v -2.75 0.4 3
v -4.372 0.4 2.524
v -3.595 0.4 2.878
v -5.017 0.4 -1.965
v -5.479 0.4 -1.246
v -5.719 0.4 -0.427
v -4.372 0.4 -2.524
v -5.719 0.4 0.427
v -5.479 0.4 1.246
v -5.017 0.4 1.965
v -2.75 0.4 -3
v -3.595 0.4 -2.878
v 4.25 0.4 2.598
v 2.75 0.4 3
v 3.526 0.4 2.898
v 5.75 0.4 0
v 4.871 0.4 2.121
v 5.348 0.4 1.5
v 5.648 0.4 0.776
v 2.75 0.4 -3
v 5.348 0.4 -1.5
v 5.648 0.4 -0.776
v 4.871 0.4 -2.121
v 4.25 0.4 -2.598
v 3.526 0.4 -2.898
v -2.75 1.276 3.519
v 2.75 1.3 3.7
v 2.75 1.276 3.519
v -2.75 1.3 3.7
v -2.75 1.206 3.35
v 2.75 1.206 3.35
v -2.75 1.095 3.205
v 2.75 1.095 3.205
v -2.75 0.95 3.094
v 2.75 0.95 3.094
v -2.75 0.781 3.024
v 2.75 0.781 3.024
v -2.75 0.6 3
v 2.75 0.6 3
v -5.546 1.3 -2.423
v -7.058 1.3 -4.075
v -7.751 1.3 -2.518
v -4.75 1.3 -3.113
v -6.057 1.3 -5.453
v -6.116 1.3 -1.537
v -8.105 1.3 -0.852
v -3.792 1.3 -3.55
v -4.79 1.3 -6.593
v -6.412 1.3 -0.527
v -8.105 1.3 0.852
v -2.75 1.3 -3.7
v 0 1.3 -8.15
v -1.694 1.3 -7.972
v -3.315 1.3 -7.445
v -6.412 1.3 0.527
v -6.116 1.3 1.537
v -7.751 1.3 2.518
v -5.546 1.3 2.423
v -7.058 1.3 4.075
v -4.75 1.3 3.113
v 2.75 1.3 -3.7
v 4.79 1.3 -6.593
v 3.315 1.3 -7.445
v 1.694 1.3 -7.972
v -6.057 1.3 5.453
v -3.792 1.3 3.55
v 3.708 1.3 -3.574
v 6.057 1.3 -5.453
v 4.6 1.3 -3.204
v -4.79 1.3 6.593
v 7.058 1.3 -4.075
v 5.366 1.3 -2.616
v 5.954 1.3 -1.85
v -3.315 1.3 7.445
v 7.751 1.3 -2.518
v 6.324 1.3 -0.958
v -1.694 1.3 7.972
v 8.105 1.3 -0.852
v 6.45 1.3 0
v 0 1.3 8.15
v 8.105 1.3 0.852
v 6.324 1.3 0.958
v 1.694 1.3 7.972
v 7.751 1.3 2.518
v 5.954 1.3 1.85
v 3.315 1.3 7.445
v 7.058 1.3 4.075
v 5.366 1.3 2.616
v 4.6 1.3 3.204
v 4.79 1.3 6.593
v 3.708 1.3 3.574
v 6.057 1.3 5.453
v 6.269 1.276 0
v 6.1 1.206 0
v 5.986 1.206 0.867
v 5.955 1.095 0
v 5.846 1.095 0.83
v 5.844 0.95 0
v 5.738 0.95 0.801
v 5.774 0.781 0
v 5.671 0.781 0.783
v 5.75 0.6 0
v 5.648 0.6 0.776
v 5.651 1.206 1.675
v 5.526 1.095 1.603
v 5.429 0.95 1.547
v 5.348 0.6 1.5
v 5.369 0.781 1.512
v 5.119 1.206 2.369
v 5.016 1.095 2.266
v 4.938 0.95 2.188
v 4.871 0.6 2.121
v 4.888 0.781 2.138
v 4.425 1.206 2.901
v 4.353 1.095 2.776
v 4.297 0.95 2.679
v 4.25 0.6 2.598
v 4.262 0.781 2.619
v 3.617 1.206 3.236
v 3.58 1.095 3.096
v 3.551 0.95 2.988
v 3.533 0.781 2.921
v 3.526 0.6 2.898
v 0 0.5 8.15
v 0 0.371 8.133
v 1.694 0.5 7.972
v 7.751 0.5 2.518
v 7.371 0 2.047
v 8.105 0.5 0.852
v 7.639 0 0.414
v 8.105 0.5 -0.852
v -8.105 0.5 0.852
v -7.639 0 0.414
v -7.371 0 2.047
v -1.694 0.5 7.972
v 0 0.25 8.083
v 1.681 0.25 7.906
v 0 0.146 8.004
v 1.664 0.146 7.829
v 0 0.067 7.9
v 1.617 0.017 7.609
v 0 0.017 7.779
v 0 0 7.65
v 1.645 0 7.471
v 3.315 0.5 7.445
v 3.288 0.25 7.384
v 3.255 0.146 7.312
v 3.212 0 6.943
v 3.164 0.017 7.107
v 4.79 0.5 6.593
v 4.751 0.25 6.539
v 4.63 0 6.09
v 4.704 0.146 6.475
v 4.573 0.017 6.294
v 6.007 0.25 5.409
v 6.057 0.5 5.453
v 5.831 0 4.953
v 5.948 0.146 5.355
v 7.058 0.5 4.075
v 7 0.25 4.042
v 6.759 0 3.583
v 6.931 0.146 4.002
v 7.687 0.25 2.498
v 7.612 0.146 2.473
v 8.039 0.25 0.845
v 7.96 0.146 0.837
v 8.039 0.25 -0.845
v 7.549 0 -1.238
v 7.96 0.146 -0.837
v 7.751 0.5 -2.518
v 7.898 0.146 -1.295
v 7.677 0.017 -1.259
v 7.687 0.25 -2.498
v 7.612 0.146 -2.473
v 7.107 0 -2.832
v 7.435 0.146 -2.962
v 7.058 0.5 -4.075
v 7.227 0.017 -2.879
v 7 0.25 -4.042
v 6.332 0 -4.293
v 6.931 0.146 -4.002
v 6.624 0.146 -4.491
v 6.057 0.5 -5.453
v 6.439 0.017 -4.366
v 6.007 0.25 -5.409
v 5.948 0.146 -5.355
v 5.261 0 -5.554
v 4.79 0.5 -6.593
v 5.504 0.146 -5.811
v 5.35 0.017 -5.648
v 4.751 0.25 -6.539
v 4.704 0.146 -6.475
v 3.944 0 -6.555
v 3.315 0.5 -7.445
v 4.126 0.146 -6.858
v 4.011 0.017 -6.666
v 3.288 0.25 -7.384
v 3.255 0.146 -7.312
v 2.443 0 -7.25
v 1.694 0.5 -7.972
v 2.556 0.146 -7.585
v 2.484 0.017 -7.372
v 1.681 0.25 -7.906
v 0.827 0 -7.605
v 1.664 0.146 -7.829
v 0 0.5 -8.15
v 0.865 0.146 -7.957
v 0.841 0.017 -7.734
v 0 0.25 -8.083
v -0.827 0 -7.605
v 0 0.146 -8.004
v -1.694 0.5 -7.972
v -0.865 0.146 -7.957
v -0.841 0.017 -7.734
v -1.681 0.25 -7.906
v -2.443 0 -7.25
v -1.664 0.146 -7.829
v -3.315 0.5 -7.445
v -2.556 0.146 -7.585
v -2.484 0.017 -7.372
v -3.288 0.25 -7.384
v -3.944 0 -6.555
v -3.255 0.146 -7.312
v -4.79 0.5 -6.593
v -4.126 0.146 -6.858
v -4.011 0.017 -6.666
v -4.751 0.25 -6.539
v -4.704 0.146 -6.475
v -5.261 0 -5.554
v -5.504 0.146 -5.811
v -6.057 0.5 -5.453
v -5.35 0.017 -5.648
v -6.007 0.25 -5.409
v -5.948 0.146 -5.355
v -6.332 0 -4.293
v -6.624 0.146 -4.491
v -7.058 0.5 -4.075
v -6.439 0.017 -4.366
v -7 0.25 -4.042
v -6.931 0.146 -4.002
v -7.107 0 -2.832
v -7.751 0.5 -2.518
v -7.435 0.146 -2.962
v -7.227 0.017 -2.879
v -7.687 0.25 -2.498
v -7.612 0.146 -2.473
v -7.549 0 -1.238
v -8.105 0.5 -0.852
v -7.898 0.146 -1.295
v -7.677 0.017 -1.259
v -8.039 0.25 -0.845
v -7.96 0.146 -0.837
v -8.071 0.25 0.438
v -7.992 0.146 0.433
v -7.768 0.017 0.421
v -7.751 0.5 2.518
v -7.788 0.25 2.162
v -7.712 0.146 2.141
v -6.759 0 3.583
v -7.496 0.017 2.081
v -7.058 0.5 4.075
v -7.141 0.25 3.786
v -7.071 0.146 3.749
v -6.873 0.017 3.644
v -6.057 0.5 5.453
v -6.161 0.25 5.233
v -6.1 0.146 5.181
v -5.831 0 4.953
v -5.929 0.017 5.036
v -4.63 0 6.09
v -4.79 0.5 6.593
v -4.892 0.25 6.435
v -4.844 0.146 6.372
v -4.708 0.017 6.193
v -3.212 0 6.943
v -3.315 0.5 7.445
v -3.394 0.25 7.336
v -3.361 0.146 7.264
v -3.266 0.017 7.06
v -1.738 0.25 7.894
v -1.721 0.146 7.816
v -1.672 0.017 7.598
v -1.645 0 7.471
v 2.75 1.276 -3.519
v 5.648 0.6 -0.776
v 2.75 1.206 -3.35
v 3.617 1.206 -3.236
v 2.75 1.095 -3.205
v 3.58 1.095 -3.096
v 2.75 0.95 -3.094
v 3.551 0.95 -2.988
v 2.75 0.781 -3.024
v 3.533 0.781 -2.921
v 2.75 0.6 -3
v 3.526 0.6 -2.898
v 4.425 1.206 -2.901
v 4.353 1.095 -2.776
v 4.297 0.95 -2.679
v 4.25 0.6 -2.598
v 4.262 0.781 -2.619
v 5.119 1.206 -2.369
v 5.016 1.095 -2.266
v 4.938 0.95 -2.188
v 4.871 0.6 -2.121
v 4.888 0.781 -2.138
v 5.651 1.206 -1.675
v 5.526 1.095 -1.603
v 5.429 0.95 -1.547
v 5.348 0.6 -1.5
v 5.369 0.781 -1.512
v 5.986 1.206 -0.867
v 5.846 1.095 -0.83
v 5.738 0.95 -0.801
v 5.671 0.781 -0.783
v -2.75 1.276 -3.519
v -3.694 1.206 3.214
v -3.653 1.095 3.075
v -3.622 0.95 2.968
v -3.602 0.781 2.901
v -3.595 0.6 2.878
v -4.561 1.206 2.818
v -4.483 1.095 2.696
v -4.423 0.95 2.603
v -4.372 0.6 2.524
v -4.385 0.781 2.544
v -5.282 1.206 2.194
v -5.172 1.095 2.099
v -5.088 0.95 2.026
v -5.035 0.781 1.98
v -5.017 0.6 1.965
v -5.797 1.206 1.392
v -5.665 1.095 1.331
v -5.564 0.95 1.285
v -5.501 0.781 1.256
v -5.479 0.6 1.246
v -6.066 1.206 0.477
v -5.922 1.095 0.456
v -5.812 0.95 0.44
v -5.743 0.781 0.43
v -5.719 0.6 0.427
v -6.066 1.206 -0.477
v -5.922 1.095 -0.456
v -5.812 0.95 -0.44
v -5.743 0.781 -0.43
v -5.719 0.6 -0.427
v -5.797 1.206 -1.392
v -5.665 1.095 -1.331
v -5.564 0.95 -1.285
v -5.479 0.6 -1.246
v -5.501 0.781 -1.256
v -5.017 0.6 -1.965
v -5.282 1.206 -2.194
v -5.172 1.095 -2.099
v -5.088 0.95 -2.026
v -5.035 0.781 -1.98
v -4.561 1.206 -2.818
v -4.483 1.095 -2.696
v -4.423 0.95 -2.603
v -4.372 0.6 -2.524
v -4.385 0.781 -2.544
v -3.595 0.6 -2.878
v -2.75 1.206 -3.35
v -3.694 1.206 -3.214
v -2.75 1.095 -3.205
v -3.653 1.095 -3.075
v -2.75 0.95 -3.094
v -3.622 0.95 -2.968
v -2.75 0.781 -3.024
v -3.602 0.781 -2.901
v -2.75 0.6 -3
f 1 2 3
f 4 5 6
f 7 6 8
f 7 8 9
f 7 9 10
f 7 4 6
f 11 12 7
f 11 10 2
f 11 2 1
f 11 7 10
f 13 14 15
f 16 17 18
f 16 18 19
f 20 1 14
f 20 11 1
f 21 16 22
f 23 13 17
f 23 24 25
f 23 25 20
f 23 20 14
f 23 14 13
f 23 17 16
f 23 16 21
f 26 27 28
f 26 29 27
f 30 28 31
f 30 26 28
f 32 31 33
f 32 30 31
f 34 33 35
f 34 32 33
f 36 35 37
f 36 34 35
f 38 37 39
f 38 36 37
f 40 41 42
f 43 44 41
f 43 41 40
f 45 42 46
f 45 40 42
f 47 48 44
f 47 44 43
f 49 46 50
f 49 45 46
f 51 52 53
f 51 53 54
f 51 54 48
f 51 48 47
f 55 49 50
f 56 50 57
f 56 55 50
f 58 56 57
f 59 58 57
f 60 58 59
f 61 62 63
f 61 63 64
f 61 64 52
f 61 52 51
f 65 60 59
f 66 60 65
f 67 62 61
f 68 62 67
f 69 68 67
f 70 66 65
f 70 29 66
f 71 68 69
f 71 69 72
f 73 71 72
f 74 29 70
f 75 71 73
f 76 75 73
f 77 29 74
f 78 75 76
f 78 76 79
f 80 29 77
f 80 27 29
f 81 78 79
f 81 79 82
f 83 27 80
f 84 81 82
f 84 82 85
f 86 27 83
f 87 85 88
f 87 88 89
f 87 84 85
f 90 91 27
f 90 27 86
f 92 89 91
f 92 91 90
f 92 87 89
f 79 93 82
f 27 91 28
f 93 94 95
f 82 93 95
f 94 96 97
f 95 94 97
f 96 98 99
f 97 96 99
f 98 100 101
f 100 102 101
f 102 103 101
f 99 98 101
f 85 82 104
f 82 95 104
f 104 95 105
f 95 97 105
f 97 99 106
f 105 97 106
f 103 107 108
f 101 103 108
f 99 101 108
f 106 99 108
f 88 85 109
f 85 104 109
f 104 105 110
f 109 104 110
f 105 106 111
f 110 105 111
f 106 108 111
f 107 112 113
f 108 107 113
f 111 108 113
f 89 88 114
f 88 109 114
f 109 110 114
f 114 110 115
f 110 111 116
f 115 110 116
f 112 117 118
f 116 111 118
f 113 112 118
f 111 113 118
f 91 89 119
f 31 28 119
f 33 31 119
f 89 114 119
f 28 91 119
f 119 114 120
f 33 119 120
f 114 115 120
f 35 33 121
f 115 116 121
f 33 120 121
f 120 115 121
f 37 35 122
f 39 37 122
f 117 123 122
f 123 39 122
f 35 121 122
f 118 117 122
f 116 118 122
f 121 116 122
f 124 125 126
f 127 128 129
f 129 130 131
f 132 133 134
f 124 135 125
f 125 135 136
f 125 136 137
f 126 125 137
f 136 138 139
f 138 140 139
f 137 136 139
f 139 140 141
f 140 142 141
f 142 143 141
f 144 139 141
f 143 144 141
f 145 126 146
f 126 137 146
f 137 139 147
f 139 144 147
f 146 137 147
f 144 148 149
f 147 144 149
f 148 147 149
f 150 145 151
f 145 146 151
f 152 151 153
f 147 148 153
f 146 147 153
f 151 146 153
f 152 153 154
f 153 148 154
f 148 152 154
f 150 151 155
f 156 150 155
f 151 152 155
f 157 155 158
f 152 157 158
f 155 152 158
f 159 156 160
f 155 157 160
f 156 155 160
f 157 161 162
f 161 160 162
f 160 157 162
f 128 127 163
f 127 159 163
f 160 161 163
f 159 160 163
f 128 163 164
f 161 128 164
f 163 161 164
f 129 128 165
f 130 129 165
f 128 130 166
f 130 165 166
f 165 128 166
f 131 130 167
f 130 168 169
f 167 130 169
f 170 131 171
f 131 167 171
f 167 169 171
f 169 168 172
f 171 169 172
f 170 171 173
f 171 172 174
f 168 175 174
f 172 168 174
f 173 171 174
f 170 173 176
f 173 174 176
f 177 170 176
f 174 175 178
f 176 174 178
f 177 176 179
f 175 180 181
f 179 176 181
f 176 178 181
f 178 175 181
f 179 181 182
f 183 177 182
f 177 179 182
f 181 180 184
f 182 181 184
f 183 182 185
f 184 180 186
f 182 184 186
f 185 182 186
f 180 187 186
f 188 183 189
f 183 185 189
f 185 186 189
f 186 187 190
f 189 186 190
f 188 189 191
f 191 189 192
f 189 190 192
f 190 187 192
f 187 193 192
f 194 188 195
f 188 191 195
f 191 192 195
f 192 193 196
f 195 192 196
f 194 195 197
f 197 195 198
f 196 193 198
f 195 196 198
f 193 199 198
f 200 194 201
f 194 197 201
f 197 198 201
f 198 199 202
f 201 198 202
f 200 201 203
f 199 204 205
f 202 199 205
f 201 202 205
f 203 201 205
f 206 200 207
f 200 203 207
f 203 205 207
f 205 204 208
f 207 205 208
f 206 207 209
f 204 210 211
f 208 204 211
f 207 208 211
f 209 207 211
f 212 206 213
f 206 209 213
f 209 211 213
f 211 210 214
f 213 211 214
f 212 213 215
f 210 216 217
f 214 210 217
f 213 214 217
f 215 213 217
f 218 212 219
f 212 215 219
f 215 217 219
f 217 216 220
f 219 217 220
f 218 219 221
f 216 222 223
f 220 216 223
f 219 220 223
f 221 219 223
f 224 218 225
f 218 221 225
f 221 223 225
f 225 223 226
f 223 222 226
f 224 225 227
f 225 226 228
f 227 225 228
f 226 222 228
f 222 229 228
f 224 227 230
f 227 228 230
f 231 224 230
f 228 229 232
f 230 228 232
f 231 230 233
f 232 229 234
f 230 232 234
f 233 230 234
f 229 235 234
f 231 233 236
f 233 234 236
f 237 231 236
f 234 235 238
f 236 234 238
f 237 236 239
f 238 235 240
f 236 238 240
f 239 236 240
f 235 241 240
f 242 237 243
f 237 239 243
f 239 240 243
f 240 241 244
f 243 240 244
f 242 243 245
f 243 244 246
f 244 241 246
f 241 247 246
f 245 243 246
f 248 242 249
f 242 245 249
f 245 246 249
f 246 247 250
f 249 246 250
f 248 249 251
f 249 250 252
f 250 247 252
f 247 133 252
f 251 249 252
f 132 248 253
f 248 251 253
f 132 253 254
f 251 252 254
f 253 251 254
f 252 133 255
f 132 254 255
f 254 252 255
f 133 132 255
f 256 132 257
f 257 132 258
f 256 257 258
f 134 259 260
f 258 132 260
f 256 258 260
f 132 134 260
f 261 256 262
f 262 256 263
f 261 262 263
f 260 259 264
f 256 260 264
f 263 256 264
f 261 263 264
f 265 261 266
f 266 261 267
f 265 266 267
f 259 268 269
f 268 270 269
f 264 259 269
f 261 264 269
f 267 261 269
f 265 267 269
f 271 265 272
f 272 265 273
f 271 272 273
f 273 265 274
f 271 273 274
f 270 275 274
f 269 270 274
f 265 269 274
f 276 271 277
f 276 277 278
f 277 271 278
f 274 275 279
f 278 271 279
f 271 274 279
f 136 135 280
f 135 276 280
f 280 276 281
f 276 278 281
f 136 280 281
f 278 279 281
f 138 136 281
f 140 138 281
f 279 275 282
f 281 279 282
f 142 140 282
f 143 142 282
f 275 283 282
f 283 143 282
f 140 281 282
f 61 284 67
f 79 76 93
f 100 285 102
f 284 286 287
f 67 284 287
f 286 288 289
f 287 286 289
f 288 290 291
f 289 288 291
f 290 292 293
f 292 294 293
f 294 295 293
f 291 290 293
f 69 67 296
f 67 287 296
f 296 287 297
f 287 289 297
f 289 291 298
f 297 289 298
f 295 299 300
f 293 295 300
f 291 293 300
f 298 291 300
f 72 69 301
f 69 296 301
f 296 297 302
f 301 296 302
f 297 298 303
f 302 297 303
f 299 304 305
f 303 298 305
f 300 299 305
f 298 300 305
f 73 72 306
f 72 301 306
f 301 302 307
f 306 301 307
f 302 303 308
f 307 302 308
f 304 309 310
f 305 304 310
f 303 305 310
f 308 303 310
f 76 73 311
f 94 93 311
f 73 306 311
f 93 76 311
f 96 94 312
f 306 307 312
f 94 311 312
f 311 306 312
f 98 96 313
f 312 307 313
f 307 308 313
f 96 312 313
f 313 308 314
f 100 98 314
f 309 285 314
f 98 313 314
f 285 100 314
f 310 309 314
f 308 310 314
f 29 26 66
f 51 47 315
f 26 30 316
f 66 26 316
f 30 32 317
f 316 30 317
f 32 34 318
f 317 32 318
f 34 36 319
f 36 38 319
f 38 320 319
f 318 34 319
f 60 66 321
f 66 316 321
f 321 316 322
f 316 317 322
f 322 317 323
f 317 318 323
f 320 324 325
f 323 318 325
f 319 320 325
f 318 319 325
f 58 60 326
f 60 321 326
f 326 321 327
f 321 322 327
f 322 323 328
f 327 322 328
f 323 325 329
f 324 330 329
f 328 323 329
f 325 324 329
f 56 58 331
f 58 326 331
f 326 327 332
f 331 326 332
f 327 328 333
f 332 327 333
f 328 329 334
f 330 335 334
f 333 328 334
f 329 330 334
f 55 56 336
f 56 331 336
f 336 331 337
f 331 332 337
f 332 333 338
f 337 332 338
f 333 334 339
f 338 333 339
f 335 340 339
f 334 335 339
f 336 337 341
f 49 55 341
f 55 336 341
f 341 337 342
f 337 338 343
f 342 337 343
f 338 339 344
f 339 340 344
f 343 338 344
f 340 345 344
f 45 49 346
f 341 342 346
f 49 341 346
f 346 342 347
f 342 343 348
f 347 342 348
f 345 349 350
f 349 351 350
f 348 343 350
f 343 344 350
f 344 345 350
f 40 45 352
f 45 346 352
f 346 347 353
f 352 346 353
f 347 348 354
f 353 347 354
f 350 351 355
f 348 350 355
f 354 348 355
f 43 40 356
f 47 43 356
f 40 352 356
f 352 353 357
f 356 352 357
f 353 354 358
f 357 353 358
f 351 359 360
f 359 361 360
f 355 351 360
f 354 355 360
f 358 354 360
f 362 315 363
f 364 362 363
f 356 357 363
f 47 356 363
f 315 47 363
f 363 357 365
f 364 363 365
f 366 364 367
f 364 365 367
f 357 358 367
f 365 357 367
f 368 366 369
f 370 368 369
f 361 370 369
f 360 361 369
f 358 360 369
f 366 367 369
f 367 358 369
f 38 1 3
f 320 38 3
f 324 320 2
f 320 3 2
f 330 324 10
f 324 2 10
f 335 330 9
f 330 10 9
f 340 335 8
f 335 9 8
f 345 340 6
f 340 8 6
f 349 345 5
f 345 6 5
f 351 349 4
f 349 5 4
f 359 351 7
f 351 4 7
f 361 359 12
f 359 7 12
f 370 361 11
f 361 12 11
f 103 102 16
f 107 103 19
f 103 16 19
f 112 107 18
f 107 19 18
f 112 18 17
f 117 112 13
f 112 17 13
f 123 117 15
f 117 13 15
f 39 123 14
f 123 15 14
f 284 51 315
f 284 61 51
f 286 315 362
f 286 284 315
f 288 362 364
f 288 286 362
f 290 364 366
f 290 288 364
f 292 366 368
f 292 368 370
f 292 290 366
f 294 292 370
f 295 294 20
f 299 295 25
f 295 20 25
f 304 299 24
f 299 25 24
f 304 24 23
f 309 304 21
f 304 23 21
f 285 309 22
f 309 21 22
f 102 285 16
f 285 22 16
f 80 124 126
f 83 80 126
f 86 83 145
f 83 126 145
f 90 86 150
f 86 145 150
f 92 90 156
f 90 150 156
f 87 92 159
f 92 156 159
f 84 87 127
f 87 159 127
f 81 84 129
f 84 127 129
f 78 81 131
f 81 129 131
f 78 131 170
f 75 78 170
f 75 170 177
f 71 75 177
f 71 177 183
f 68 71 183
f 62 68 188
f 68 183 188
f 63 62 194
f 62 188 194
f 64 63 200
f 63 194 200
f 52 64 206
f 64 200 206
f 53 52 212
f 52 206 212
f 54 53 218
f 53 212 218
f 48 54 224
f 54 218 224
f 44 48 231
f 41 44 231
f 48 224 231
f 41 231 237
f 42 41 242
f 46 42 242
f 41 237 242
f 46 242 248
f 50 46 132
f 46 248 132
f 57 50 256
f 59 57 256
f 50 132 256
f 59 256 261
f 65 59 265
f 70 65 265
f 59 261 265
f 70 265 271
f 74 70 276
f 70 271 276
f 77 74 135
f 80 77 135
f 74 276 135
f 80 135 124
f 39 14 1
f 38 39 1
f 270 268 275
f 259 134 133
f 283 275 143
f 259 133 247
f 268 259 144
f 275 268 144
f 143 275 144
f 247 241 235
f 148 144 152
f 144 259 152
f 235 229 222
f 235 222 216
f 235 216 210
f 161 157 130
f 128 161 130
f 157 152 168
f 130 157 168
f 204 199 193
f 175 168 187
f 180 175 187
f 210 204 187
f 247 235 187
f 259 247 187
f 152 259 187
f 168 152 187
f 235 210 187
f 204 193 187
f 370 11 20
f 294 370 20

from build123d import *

# Parameters (mm, degrees)
SKETCH1_R           = 8.15
BOSS_EXTRUDE1_DEPTH = 1.3
BOSS_EXTRUDE2_DEPTH = 0.4
FILLET3_R           = 0.7
FILLET4_R           = 0.5


with BuildPart() as part:
    # Sketch1 → Boss-Extrude1 (new body)
    with BuildSketch(Plane(origin=(0, 0, 0), x_dir=(1, 0, 0), z_dir=(0, 1, 0))):
        Circle(SKETCH1_R)
        with BuildLine():
            ThreePointArc((-2.75, -3), (-5.75, 0), (-2.75, 3))
            Line((-2.75, 3), (2.75, 3))
            ThreePointArc((2.75, 3), (4.871320344, 2.121320344), (5.75, 0))
            ThreePointArc((5.75, 0), (4.871320344, -2.121320344), (2.75, -3))
            Line((2.75, -3), (-2.75, -3))
        make_face(mode=Mode.SUBTRACT)
    extrude(amount=BOSS_EXTRUDE1_DEPTH)

    # Sketch1<3> → Boss-Extrude2 (add)
    with BuildSketch(Plane(origin=(0, 0, 0), x_dir=(1, 0, 0), z_dir=(0, 1, 0))):
        with BuildLine():
            ThreePointArc((-2.75, 3), (-5.75, 0), (-2.75, -3))
            Line((-2.75, -3), (2.75, -3))
            ThreePointArc((2.75, -3), (5.75, 0), (2.75, 3))
            Line((2.75, 3), (-2.75, 3))
        make_face()
    extrude(amount=BOSS_EXTRUDE2_DEPTH)

    # Fillet3
    fillet3_edges = [part.edges().sort_by_distance(p)[0] for p in [
        (5.75, 1.3, 0),
        (0, 1.3, 3),
        (-5.75, 1.3, 0),
        (0, 1.3, -3),
    ]]
    fillet(fillet3_edges, radius=FILLET3_R)

    # Fillet4
    fillet4_edges = [part.edges().sort_by_distance(p)[0] for p in [
        (-8.15, 0, 0),
    ]]
    fillet(fillet4_edges, radius=FILLET4_R)


solid = part.part
